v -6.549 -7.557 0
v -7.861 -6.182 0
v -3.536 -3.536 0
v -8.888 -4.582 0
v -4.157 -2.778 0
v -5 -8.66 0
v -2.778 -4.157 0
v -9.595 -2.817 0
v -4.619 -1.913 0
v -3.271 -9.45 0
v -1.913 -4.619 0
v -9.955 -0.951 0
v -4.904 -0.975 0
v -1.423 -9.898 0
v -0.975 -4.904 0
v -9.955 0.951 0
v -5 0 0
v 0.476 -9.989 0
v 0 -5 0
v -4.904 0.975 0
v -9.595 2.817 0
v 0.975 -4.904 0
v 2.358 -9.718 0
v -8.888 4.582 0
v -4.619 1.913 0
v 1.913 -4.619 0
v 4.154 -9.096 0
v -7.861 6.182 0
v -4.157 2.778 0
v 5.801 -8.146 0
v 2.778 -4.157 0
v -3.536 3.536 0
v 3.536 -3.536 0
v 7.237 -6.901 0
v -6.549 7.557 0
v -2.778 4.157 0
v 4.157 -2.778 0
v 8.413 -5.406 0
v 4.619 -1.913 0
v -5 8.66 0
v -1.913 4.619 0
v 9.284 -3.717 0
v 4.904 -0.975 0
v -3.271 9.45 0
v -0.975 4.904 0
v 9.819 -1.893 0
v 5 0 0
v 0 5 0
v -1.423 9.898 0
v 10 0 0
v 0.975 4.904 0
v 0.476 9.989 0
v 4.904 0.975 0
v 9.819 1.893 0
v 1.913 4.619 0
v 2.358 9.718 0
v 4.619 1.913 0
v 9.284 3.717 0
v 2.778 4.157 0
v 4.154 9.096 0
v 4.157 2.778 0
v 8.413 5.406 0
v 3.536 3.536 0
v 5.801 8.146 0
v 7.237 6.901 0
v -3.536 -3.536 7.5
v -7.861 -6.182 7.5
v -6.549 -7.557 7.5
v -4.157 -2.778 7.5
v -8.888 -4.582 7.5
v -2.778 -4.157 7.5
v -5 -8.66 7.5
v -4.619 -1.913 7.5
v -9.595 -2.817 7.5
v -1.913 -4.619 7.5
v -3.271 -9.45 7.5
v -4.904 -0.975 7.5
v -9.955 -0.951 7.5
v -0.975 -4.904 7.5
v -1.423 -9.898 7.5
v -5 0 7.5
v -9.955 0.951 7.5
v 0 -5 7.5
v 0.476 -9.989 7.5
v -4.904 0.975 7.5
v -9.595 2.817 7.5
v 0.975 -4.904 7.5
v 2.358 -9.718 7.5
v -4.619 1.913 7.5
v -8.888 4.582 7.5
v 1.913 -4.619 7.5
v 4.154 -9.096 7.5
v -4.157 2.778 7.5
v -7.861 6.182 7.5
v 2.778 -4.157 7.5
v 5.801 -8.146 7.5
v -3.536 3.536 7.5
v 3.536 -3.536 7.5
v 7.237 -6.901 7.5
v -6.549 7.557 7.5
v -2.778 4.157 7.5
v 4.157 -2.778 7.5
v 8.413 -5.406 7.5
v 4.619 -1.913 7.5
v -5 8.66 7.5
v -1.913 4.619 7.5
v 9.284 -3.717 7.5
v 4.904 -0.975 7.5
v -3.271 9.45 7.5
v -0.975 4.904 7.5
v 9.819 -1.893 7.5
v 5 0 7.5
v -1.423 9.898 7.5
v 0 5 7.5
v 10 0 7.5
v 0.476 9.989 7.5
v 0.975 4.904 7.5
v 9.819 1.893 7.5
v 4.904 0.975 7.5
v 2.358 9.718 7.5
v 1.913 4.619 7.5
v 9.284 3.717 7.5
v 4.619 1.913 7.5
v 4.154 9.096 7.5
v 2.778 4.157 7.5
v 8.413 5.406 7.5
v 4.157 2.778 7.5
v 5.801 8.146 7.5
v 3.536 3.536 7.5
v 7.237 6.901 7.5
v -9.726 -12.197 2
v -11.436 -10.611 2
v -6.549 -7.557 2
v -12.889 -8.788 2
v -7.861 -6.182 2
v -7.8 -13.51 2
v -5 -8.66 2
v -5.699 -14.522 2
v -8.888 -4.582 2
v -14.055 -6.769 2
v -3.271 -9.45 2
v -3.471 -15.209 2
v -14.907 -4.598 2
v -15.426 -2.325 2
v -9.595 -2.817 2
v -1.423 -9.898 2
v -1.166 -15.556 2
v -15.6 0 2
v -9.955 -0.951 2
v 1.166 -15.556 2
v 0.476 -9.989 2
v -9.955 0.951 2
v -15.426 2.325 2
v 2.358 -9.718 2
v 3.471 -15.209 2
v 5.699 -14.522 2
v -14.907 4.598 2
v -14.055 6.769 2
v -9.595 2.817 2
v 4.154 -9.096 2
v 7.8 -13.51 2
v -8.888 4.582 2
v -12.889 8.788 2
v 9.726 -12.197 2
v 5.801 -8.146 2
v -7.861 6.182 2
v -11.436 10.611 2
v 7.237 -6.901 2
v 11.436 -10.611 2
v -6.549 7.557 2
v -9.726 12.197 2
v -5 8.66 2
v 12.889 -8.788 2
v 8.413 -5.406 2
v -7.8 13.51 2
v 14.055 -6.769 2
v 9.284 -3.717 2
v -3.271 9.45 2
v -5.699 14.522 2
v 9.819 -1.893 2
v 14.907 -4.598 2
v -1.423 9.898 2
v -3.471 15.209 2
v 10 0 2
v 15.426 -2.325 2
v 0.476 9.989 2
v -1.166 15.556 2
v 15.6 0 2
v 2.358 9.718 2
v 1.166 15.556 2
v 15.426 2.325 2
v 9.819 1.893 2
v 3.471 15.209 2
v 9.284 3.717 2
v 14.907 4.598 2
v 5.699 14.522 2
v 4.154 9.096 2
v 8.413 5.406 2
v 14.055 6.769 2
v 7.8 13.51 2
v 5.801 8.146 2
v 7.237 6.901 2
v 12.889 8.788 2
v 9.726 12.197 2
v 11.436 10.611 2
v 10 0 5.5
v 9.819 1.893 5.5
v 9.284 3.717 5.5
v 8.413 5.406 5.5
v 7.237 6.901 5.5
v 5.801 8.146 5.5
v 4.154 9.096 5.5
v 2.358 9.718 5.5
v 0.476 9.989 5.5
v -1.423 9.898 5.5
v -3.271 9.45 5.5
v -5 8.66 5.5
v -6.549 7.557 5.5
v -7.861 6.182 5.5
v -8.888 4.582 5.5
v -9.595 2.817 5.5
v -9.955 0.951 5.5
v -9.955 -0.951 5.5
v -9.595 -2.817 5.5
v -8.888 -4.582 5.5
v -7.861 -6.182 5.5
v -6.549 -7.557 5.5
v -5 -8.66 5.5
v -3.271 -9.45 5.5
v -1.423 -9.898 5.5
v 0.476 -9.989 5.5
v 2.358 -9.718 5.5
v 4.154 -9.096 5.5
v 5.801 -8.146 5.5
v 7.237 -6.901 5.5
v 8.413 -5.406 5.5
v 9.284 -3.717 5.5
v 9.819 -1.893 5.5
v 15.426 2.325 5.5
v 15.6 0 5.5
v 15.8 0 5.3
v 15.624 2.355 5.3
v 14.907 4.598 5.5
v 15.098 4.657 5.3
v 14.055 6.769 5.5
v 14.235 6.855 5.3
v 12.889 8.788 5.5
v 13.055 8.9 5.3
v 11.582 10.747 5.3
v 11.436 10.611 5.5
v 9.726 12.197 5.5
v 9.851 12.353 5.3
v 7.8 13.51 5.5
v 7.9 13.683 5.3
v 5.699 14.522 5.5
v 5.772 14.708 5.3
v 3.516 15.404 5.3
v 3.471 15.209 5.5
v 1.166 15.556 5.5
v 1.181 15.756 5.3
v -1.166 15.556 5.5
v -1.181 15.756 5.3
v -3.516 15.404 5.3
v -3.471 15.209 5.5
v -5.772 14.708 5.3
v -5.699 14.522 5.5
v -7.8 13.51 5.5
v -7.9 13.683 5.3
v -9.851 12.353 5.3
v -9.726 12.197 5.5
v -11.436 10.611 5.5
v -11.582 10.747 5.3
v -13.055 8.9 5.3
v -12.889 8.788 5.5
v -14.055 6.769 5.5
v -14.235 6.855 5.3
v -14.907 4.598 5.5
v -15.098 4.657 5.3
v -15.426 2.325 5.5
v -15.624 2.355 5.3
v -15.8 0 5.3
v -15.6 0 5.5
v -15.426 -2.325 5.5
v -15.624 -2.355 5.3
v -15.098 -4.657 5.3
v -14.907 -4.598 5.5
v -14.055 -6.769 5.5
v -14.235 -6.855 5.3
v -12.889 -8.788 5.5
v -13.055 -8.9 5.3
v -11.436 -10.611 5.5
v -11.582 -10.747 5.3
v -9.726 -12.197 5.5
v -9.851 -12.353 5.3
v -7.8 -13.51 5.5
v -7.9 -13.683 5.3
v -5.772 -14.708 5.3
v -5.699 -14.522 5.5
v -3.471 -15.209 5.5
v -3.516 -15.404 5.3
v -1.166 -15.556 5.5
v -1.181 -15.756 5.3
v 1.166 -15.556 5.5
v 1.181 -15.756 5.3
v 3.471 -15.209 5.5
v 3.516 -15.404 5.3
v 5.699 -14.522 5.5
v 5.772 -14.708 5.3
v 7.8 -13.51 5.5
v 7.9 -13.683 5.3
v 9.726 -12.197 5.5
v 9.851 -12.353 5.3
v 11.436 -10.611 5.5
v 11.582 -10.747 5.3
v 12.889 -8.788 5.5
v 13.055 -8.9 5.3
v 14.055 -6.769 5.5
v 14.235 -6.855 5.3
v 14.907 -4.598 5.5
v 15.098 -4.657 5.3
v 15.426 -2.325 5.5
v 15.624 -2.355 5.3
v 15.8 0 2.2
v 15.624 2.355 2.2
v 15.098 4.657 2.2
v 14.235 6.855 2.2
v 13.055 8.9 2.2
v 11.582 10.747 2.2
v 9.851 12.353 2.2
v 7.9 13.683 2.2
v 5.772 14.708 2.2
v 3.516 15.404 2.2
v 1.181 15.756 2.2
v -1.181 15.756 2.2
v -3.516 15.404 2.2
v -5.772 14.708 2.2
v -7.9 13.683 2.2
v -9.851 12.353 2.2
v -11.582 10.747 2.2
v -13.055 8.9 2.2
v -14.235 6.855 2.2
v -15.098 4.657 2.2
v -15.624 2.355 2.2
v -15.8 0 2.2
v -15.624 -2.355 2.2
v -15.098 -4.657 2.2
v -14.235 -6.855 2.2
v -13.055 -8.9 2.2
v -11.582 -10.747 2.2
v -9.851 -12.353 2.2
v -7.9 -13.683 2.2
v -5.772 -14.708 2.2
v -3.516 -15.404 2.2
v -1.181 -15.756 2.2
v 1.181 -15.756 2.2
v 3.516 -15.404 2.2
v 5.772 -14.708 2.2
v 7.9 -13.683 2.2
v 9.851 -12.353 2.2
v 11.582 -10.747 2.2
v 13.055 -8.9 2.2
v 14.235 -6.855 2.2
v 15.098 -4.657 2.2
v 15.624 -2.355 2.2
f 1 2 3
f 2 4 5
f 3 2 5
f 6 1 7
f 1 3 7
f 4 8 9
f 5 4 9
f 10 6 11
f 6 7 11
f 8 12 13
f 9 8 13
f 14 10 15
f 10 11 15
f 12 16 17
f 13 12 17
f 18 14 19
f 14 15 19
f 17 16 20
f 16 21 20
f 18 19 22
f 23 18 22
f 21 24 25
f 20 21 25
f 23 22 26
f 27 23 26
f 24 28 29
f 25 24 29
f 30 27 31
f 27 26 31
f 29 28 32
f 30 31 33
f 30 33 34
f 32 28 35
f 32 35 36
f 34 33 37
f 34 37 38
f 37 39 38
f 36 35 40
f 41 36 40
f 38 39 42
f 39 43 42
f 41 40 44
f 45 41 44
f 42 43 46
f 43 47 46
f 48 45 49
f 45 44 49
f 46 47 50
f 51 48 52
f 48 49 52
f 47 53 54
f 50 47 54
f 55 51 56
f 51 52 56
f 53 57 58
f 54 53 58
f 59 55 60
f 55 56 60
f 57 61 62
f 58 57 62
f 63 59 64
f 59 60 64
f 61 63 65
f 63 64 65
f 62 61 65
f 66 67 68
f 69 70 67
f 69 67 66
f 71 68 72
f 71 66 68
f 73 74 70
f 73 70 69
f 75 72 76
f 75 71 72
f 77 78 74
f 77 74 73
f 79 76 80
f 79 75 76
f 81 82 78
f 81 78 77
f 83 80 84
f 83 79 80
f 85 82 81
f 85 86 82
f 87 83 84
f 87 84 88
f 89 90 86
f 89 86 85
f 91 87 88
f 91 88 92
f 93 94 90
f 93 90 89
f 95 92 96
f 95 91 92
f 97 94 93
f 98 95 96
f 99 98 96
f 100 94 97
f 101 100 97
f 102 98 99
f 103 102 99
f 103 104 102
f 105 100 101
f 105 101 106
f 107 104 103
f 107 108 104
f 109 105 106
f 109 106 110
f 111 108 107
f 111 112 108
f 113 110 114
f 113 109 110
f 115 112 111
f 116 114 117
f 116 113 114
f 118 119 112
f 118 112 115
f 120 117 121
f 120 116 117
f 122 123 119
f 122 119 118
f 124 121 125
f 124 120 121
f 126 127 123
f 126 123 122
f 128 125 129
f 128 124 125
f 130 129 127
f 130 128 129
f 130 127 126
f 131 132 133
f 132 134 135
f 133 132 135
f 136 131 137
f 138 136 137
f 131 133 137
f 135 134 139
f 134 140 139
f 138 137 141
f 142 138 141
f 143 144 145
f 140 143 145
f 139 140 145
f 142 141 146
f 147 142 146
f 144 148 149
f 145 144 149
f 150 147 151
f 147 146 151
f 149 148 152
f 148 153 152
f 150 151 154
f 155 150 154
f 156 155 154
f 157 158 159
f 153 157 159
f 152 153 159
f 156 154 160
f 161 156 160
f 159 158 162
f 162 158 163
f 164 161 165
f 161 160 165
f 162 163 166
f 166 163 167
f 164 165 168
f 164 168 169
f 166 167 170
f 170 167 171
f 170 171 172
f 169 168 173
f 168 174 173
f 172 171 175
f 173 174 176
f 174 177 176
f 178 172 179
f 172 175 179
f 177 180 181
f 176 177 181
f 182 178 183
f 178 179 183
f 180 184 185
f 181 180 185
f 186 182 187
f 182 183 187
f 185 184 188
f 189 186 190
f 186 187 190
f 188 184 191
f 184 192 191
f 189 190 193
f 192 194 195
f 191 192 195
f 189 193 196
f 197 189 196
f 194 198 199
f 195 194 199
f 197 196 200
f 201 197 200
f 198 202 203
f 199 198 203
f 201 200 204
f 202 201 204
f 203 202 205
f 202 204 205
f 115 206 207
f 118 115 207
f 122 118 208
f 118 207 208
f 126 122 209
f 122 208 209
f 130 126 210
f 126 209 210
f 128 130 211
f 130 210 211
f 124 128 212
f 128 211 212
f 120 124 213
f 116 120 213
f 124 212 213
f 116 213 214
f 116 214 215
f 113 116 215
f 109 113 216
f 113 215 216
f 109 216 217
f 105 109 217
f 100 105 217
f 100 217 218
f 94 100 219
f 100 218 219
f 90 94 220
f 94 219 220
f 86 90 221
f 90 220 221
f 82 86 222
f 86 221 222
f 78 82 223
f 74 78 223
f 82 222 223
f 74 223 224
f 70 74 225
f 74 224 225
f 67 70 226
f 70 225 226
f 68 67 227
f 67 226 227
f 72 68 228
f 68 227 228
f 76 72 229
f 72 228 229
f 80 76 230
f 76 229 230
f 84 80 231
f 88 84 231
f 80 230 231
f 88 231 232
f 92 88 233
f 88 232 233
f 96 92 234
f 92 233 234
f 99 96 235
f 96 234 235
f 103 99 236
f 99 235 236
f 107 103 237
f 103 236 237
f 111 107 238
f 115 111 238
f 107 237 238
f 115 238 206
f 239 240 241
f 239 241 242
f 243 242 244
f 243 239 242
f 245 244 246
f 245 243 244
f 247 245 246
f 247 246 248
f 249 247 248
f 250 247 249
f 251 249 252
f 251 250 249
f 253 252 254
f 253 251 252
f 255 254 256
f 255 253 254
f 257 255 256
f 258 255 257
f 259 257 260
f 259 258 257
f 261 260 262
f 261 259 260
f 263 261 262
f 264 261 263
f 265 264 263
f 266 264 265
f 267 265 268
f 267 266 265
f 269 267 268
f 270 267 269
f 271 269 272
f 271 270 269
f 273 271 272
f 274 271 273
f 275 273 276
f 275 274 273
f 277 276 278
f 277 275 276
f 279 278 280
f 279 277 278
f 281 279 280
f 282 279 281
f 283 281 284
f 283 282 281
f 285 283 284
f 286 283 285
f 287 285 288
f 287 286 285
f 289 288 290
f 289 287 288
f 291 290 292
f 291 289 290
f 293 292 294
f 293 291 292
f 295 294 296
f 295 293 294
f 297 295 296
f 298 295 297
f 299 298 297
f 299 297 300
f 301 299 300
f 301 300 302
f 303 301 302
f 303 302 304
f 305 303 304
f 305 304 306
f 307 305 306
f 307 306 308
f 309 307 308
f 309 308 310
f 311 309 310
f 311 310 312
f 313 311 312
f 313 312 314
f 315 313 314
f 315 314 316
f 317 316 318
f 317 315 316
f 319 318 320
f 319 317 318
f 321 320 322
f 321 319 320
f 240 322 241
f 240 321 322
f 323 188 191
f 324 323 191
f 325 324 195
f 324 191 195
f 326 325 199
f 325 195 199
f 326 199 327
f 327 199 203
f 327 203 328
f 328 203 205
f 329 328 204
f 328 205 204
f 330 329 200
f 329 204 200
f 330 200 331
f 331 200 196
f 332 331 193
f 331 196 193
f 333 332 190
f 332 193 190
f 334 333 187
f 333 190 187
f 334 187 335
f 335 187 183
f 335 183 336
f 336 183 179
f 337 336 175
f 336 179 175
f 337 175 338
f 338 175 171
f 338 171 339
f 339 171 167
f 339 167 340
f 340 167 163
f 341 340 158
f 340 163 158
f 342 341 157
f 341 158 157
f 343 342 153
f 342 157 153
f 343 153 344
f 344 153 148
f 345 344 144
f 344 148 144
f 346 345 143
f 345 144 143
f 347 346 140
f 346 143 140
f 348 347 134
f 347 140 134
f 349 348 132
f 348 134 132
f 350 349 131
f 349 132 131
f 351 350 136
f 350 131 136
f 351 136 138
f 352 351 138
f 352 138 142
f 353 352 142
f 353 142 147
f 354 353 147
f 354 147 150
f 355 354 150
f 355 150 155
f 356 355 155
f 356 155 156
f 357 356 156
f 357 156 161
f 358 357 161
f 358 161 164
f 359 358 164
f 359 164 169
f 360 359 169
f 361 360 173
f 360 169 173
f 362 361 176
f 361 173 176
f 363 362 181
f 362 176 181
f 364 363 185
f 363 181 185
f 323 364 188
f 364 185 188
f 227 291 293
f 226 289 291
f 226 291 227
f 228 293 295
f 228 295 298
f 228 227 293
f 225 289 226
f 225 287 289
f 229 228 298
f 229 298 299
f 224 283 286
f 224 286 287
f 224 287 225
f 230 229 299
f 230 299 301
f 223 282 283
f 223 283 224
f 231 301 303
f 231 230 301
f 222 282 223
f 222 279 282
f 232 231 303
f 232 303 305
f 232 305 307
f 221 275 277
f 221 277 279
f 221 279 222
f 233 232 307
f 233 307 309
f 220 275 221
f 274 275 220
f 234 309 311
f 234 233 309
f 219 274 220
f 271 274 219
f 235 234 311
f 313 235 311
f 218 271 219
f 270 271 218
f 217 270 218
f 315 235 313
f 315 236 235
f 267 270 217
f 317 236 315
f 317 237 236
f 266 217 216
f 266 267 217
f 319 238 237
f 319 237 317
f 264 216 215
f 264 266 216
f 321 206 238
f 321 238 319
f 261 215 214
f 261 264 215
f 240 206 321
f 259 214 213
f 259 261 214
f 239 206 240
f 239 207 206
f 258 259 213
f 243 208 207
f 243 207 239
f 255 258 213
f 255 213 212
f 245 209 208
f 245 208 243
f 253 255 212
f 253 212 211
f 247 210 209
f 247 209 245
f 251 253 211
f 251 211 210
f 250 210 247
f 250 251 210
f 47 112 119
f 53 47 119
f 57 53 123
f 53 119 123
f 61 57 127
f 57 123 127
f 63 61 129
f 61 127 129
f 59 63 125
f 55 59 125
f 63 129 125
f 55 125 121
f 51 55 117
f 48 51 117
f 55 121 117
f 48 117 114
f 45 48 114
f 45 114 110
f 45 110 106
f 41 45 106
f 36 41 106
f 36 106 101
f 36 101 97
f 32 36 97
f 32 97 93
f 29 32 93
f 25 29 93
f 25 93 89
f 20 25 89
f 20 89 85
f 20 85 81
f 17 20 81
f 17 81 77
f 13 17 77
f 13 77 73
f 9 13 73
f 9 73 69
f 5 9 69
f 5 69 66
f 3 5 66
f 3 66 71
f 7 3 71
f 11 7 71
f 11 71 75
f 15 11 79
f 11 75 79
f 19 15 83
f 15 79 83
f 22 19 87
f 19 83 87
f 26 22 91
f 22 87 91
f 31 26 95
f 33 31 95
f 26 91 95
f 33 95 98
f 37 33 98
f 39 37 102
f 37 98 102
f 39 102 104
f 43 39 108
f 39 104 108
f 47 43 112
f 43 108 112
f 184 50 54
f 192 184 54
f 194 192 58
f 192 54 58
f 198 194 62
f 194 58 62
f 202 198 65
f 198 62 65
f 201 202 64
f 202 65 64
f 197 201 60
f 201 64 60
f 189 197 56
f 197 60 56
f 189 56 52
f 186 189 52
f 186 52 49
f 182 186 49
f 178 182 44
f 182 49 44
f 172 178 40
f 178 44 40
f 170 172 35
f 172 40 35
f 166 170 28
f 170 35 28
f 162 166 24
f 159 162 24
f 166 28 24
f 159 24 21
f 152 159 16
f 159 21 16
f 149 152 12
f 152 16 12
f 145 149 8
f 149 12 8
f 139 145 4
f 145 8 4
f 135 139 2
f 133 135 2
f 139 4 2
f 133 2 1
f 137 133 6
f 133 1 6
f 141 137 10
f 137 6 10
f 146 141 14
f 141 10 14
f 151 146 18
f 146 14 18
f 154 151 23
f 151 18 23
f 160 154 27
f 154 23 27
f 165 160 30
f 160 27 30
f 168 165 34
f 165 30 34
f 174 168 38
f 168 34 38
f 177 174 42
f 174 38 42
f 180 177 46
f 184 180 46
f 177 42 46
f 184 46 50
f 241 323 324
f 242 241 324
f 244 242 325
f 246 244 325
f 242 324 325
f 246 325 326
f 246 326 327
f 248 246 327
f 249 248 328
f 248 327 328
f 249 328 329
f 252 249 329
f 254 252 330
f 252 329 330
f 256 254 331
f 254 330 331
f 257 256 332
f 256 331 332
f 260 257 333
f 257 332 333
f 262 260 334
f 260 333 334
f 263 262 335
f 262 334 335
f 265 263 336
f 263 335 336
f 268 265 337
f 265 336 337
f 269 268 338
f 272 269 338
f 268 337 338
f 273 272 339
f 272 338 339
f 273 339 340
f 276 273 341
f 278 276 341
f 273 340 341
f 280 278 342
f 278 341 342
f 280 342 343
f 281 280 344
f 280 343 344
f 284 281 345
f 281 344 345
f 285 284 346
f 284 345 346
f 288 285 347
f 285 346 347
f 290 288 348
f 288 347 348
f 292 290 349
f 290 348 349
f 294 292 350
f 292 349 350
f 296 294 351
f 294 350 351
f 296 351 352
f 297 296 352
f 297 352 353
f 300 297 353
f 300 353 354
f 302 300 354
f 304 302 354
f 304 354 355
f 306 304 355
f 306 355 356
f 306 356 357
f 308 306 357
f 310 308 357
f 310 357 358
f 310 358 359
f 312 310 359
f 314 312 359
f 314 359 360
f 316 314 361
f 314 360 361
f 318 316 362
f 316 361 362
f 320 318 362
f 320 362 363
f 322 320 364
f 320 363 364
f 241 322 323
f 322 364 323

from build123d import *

# Parameters (mm, degrees)
SKETCH_1_R          = 10
EXTRUDE_1_DEPTH     = 2
SKETCH_2_R          = 15.8
EXTRUDE_2_DEPTH     = 3.5
SKETCH_3_R          = 10
EXTRUDE_3_DEPTH     = 2
SKETCH_4_R          = 5
CUT_EXTRUDE_1_DEPTH = 10
CHAMFER_1_SIZE      = 0.2


with BuildPart() as part:
    # 草图1 → 凸台-拉伸1 (new body)
    with BuildSketch(Plane.XY):
        Circle(SKETCH_1_R)
    extrude(amount=EXTRUDE_1_DEPTH)

    # 草图2 → 凸台-拉伸2 (add)
    with BuildSketch(Plane.XY.offset(2)):
        Circle(SKETCH_2_R)
    extrude(amount=EXTRUDE_2_DEPTH)

    # 草图3 → 凸台-拉伸3 (add)
    with BuildSketch(Plane.XY.offset(5.5)):
        Circle(SKETCH_3_R)
    extrude(amount=EXTRUDE_3_DEPTH)

    # 草图4 → 切除-拉伸1 (cut)
    with BuildSketch(Plane.XY.offset(7.5)):
        Circle(SKETCH_4_R)
    extrude(amount=-CUT_EXTRUDE_1_DEPTH, mode=Mode.SUBTRACT)

    # 倒角1
    chamfer_1_edges = [part.edges().sort_by_distance(p)[0] for p in [
        (-15.8, 0, 2),
        (-15.8, 0, 5.5),
    ]]
    chamfer(chamfer_1_edges, length=CHAMFER_1_SIZE)


solid = part.part
